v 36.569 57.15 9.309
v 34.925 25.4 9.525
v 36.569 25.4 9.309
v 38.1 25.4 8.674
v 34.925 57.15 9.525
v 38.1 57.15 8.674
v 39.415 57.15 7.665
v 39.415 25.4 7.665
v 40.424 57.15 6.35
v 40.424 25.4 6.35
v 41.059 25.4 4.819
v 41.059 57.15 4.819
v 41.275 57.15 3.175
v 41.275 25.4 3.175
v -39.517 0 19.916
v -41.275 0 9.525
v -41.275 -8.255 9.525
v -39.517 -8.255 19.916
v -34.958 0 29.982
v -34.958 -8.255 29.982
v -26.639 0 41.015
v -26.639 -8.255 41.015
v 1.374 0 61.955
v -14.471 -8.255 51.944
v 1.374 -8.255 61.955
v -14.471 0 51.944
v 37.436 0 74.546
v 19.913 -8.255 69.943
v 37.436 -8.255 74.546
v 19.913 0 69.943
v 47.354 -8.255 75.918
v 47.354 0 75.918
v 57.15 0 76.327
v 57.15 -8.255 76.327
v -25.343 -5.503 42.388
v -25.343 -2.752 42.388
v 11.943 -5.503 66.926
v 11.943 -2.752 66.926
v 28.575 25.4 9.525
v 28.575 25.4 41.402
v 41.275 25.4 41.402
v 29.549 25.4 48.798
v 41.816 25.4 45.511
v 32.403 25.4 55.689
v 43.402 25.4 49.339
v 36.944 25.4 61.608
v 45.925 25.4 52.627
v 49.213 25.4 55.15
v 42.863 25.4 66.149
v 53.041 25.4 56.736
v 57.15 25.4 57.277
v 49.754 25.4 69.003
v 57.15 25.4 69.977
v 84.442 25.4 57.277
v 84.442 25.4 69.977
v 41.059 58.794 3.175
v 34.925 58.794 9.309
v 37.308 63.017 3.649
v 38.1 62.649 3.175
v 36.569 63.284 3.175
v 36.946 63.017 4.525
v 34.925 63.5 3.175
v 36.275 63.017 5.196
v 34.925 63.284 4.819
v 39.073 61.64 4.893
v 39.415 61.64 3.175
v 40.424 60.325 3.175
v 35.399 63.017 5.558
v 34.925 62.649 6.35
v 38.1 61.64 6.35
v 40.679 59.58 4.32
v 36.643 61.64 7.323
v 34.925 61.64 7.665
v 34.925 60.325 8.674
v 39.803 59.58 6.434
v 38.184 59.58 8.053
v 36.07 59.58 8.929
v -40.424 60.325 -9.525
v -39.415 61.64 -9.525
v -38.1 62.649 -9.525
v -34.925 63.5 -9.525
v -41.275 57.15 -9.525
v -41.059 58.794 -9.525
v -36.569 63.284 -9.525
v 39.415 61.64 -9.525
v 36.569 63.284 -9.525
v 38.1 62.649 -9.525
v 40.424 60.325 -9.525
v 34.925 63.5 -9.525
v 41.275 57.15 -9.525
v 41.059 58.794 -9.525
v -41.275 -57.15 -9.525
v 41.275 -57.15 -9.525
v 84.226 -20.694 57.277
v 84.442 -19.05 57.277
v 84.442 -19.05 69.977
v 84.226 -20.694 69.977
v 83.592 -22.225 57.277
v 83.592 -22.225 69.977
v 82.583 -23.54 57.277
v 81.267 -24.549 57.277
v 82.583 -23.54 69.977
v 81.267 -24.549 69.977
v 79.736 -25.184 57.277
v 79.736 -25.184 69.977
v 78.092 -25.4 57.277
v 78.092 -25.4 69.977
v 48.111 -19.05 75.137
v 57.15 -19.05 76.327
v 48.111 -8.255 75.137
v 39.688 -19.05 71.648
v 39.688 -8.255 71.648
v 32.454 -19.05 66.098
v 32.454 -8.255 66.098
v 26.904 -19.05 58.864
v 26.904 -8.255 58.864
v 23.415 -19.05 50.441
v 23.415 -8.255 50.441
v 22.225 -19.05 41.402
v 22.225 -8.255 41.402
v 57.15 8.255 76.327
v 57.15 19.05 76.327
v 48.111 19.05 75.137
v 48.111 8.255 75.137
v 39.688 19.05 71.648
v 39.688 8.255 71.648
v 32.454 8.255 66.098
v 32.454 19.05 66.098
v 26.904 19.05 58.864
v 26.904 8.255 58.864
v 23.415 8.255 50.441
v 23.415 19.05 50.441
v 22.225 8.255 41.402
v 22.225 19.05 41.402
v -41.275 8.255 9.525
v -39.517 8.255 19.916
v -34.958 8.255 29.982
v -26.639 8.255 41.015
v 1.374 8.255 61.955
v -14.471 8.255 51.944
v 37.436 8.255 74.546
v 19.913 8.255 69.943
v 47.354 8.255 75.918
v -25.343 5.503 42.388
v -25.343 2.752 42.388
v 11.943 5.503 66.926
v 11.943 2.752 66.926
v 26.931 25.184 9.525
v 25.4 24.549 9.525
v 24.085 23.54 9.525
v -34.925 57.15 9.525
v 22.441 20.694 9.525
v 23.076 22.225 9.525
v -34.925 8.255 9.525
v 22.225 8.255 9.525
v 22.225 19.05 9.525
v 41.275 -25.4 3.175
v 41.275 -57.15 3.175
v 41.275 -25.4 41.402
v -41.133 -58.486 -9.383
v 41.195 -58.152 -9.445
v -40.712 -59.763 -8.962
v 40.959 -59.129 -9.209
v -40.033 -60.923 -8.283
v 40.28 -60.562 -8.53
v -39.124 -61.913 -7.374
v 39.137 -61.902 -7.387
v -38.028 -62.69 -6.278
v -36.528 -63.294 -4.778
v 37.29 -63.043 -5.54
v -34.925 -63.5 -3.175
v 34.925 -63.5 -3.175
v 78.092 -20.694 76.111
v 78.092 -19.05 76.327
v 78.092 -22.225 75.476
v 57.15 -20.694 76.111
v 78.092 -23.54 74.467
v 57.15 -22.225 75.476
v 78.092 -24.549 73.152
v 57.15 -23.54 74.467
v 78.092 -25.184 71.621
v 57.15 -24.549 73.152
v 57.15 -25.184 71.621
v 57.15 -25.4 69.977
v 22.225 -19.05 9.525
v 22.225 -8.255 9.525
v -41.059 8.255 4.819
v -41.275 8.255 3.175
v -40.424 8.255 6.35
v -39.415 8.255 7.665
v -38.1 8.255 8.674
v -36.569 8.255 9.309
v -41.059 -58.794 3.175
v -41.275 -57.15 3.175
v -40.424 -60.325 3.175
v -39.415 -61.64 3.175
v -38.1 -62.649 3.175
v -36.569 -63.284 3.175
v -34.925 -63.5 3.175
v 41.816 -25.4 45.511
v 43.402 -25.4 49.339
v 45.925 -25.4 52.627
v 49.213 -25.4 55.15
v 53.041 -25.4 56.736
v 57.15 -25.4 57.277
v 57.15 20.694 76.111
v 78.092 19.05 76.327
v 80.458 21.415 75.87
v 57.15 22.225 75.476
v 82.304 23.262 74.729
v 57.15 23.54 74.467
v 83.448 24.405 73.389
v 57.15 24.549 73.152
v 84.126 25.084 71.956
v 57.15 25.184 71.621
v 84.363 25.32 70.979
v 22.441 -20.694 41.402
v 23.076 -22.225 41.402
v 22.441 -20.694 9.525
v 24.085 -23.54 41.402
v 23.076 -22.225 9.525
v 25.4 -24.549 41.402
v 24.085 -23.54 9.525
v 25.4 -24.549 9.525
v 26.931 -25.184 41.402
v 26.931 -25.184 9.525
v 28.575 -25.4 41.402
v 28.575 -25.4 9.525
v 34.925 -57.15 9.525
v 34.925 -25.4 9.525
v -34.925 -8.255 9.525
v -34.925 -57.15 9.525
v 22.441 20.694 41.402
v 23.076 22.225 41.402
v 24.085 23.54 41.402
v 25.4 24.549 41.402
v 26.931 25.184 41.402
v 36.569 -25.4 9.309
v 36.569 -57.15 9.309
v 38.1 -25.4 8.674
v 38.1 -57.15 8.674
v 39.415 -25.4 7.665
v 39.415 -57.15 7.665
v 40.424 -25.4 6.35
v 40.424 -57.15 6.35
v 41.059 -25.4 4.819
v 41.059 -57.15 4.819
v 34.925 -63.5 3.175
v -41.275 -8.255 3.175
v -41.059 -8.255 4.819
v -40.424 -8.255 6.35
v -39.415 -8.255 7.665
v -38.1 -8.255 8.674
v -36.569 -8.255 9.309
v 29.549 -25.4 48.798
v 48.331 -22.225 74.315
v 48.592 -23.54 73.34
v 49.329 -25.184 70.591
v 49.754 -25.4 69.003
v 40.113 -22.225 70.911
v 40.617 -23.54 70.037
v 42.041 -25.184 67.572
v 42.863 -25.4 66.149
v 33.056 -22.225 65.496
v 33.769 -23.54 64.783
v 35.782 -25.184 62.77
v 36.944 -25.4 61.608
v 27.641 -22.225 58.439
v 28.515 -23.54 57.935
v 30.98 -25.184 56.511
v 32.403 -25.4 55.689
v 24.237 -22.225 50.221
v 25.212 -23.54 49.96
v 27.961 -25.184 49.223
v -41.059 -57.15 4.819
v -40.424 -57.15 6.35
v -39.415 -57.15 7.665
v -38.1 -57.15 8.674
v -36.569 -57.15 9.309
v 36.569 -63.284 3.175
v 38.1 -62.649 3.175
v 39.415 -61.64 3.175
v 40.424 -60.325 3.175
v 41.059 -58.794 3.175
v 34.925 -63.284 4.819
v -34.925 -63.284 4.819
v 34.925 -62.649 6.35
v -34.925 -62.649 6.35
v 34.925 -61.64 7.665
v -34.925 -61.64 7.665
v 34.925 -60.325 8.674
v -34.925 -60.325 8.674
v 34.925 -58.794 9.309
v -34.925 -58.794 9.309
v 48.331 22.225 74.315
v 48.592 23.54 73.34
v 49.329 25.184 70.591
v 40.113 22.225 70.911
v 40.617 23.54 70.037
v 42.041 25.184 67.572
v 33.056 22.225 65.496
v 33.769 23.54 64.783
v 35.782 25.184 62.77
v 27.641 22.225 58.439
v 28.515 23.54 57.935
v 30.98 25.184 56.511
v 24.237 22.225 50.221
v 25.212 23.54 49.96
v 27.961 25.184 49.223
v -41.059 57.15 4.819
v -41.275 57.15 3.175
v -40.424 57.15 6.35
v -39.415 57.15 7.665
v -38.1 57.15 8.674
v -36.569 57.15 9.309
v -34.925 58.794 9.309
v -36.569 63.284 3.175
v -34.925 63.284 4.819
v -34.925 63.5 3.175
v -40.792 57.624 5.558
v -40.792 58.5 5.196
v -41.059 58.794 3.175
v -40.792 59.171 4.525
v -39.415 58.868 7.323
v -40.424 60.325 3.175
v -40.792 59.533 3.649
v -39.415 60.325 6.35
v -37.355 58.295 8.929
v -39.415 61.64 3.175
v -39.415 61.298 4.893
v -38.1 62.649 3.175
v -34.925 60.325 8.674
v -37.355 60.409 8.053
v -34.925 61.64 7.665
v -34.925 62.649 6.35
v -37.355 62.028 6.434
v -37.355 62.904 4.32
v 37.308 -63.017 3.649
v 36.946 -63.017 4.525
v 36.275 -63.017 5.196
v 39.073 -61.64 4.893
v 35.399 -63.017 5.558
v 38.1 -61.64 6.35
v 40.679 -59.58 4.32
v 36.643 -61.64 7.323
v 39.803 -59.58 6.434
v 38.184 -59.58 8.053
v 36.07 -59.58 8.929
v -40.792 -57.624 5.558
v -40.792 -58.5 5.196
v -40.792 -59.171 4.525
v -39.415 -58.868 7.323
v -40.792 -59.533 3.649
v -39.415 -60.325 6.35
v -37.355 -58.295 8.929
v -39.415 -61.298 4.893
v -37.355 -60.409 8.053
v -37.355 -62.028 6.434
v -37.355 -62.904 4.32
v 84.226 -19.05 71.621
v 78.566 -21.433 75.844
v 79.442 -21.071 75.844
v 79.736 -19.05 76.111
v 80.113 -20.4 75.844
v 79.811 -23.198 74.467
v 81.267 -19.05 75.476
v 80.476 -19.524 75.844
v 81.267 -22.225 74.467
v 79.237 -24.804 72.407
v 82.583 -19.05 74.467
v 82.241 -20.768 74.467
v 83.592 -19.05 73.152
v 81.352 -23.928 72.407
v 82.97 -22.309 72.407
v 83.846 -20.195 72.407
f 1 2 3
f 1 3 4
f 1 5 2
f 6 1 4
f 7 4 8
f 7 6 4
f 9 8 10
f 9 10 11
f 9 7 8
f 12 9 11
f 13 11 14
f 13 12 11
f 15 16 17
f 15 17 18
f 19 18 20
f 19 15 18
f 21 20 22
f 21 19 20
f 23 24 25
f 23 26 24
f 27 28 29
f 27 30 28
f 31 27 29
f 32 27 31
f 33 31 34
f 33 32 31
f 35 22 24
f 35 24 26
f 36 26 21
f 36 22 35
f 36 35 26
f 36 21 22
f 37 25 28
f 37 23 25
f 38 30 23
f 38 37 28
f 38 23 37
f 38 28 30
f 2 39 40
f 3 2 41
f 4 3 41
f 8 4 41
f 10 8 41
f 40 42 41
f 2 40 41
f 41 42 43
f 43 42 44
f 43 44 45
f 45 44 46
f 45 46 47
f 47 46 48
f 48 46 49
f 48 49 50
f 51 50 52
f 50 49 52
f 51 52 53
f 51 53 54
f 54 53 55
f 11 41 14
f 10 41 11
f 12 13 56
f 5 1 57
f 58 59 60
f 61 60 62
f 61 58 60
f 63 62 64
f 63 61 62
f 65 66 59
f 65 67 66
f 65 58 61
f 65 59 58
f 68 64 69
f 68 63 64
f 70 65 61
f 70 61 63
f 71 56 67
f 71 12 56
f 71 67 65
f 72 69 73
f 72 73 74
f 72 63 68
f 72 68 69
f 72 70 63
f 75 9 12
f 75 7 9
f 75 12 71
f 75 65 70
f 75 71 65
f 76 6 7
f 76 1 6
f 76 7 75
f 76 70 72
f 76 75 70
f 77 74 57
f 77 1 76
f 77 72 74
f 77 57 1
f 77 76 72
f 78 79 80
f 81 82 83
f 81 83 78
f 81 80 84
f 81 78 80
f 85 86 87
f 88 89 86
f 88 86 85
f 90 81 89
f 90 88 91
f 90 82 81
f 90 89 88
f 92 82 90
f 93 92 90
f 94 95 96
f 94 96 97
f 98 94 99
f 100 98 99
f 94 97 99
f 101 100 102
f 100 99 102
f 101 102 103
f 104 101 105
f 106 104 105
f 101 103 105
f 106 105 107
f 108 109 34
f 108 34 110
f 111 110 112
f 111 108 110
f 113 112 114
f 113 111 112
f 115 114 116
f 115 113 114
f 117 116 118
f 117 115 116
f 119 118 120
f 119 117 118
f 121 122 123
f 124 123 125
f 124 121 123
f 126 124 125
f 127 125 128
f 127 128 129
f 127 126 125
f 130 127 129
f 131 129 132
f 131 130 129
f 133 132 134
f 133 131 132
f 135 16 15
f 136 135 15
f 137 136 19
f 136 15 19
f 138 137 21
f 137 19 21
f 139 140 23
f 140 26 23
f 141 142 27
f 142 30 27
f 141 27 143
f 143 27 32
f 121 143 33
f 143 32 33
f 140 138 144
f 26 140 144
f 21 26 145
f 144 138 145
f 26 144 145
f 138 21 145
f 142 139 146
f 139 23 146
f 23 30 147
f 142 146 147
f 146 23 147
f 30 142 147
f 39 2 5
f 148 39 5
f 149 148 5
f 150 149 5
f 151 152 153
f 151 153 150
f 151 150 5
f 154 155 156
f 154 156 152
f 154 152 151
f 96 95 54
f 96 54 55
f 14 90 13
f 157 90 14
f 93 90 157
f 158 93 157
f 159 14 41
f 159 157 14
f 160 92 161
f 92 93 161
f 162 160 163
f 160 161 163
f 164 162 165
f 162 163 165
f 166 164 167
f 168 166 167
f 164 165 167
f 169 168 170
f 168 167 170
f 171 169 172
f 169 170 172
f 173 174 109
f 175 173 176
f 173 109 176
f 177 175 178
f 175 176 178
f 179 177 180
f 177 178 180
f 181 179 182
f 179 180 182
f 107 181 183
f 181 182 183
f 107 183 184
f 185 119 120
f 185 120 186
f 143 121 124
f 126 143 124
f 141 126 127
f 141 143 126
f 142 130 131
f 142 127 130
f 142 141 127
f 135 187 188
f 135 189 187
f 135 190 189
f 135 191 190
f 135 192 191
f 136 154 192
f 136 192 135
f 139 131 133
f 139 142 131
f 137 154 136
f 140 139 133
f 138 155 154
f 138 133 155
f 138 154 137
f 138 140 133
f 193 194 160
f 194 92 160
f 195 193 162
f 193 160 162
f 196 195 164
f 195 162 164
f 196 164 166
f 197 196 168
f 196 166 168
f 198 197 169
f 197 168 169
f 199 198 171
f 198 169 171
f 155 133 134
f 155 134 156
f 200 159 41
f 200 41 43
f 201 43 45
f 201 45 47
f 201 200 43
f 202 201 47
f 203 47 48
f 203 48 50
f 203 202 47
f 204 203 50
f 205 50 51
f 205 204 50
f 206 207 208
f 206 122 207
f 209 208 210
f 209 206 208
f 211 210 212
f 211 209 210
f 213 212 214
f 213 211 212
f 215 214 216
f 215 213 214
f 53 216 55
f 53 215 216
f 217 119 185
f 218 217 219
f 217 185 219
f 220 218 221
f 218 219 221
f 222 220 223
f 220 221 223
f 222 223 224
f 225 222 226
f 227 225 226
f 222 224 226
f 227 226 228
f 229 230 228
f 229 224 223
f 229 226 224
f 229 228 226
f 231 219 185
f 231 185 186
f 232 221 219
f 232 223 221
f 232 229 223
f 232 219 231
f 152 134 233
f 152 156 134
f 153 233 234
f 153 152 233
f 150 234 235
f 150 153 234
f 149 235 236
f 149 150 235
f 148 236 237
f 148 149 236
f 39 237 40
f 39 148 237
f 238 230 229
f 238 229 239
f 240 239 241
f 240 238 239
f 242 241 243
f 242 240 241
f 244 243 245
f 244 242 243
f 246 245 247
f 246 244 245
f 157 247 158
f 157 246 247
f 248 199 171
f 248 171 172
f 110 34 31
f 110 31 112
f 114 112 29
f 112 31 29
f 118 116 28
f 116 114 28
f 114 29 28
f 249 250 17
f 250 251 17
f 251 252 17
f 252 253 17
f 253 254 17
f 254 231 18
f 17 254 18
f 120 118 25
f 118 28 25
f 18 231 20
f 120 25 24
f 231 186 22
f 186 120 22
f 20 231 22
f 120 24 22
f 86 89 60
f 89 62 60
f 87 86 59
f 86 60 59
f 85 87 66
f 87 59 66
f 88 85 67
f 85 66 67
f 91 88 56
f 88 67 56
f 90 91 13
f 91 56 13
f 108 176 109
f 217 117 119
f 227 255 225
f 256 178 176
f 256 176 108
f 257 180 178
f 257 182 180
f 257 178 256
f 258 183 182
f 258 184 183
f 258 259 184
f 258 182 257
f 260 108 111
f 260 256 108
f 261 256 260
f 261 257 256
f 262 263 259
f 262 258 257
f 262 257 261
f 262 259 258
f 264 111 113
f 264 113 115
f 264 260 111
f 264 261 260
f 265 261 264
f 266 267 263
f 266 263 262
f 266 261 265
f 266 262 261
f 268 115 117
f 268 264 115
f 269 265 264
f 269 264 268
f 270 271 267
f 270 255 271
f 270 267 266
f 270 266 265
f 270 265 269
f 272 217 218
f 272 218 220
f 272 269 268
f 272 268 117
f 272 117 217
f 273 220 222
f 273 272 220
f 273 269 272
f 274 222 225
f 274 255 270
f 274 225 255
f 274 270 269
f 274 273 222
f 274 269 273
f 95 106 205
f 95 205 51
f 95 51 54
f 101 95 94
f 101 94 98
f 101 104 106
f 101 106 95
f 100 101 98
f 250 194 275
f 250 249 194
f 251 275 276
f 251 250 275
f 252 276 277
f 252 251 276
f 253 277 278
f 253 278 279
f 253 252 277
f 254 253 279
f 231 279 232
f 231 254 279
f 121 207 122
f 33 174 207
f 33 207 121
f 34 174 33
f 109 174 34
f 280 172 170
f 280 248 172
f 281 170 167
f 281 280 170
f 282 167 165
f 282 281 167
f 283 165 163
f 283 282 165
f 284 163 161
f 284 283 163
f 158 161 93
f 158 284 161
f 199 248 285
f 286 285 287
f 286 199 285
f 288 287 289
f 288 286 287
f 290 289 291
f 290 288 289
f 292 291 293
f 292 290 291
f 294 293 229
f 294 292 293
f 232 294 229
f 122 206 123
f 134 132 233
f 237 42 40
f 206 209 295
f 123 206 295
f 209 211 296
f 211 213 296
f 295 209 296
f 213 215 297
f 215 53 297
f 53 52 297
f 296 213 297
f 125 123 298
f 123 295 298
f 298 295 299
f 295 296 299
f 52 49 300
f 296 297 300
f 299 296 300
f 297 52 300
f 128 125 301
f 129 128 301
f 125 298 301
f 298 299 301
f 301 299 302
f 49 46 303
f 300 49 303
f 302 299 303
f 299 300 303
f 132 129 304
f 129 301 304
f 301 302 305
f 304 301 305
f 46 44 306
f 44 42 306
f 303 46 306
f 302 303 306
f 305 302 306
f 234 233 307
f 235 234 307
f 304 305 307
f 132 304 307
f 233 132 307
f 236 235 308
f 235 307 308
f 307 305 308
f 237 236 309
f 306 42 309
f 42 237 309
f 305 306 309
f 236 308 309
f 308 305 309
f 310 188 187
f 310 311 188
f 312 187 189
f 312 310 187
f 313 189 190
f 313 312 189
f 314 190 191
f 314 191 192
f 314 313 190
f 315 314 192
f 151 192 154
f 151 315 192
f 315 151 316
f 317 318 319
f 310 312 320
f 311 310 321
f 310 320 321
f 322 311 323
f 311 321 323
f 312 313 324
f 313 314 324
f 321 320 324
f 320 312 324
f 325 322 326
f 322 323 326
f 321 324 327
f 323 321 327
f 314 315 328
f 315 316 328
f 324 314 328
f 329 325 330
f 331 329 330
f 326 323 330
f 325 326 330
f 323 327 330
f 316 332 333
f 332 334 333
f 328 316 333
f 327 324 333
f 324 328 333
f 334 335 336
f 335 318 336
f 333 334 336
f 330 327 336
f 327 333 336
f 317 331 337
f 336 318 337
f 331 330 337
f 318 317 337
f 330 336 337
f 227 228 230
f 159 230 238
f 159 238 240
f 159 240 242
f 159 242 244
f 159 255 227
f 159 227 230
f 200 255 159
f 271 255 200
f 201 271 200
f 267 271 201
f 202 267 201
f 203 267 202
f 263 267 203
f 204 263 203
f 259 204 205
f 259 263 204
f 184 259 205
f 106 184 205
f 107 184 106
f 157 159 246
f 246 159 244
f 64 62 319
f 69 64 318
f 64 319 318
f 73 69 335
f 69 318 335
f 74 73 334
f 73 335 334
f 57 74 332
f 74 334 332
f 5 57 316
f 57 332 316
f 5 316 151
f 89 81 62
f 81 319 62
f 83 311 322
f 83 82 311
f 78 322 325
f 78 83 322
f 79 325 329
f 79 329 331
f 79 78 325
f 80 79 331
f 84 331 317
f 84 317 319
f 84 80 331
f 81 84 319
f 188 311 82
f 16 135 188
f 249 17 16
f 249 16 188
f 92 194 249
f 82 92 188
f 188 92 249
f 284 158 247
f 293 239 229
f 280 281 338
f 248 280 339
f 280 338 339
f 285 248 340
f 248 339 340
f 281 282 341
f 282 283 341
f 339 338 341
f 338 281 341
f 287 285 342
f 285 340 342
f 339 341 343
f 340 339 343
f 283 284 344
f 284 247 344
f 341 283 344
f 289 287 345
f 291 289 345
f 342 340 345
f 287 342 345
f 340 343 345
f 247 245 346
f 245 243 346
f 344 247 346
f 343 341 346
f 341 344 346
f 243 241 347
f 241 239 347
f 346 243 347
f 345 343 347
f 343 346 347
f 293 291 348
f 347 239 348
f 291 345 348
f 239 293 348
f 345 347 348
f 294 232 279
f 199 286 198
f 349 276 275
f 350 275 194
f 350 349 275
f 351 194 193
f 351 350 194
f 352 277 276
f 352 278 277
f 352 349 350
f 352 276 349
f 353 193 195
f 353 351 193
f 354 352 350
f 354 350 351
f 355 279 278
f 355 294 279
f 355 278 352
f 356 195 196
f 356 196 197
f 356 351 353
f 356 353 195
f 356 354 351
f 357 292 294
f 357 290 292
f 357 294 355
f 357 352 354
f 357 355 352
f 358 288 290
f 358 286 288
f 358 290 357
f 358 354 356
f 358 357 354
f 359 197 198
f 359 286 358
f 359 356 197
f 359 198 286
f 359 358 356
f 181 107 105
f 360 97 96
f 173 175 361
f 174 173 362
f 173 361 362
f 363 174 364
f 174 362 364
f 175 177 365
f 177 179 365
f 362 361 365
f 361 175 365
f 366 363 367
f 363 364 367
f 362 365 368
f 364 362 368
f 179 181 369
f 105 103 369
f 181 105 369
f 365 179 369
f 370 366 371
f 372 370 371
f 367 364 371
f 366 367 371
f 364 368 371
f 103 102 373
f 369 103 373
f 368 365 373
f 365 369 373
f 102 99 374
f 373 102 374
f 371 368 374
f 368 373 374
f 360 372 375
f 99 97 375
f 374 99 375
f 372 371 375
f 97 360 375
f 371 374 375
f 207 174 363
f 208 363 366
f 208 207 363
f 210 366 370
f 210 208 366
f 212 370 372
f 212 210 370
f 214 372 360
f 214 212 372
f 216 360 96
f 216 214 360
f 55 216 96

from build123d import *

# Parameters (mm, degrees)
F1_DEPTH = 63.5
F0_W     = 25.4
F0_H     = 9.398
F2_DEPTH = 25.4
F3_DEPTH = 8.255
F4_R     = 6.35
F5_R     = 6.35


with BuildPart() as f1:
    # F0 (on Front) → F1 (new body, symmetric)
    with BuildSketch(Plane.XZ):
        Polygon((22.225, 9.525), (-41.275, 9.525), (-41.275, -9.525), (41.275, -9.525), (41.275, 9.525), align=None)
    extrude(amount=F1_DEPTH, both=True)

    # F0 (on Front) → F2 (join, symmetric)
    with BuildSketch(Plane.XZ):
        with BuildLine():
            Line((22.225, 41.402), (22.225, 9.525))
            Line((22.225, 9.525), (41.275, 9.525))
            Line((41.275, 9.525), (41.275, 41.402))
            ThreePointArc((41.275, 41.402), (45.9246798487, 52.6273201513), (57.15, 57.277))
            Line((57.15, 57.277), (59.0423882883, 57.277))
            Line((59.0423882883, 57.277), (59.0423882883, 66.675))
            Line((59.0423882883, 66.675), (84.4423882883, 66.675))
            Line((84.4423882883, 66.675), (84.4423882883, 76.327))
            Line((84.4423882883, 76.327), (57.15, 76.327))
            ThreePointArc((57.15, 76.327), (32.4542956671, 66.0977043329), (22.225, 41.402))
        make_face()
        with Locations((71.7423882883, 61.976)):
            Rectangle(F0_W, F0_H)
    extrude(amount=F2_DEPTH, both=True)

    # F0 (on Front) → F3 (join, symmetric)
    with BuildSketch(Plane.XZ):
        with BuildLine():
            add(Edge.make_bspline(
                [(-41.275, 9.525), (-40.4969751835, 44.2796610296), (12.460607104, 76.7662450671), (57.15, 76.327)],
                knots=[0, 0, 0, 0, 118.9537213752, 118.9537213752, 118.9537213752, 118.9537213752], degree=3))
            Line((-41.275, 9.525), (22.225, 9.525))
            Line((22.225, 9.525), (22.225, 41.402))
            ThreePointArc((22.225, 41.402), (32.4542956671, 66.0977043329), (57.15, 76.327))
        make_face()
    extrude(amount=F3_DEPTH, both=True)

    # F4
    f4_edges = [f1.edges().sort_by_distance(p)[0] for p in [
        (41.275, -44.45, 9.525),
        (41.275, -63.5, 0),
        (41.275, 44.45, 9.525),
        (41.275, 63.5, 0),
        (0, 63.5, 9.525),
        (0, -63.5, 9.525),
        (-41.275, -35.8775, 9.525),
        (-41.275, 35.8775, 9.525),
        (0, -63.5, -9.525),
        (-41.275, -63.5, 0),
        (-41.275, 63.5, 0),
    ]]
    fillet(f4_edges, radius=F4_R)

    # F5
    f5_edges = [f1.edges().sort_by_distance(p)[0] for p in [
        (84.442388, -25.4, 66.802),
        (70.796194, -25.4, 76.327),
        (84.442388, 0, 76.327),
        (70.796194, 25.4, 76.327),
    ]]
    fillet(f5_edges, radius=F5_R)


solid = f1.part
